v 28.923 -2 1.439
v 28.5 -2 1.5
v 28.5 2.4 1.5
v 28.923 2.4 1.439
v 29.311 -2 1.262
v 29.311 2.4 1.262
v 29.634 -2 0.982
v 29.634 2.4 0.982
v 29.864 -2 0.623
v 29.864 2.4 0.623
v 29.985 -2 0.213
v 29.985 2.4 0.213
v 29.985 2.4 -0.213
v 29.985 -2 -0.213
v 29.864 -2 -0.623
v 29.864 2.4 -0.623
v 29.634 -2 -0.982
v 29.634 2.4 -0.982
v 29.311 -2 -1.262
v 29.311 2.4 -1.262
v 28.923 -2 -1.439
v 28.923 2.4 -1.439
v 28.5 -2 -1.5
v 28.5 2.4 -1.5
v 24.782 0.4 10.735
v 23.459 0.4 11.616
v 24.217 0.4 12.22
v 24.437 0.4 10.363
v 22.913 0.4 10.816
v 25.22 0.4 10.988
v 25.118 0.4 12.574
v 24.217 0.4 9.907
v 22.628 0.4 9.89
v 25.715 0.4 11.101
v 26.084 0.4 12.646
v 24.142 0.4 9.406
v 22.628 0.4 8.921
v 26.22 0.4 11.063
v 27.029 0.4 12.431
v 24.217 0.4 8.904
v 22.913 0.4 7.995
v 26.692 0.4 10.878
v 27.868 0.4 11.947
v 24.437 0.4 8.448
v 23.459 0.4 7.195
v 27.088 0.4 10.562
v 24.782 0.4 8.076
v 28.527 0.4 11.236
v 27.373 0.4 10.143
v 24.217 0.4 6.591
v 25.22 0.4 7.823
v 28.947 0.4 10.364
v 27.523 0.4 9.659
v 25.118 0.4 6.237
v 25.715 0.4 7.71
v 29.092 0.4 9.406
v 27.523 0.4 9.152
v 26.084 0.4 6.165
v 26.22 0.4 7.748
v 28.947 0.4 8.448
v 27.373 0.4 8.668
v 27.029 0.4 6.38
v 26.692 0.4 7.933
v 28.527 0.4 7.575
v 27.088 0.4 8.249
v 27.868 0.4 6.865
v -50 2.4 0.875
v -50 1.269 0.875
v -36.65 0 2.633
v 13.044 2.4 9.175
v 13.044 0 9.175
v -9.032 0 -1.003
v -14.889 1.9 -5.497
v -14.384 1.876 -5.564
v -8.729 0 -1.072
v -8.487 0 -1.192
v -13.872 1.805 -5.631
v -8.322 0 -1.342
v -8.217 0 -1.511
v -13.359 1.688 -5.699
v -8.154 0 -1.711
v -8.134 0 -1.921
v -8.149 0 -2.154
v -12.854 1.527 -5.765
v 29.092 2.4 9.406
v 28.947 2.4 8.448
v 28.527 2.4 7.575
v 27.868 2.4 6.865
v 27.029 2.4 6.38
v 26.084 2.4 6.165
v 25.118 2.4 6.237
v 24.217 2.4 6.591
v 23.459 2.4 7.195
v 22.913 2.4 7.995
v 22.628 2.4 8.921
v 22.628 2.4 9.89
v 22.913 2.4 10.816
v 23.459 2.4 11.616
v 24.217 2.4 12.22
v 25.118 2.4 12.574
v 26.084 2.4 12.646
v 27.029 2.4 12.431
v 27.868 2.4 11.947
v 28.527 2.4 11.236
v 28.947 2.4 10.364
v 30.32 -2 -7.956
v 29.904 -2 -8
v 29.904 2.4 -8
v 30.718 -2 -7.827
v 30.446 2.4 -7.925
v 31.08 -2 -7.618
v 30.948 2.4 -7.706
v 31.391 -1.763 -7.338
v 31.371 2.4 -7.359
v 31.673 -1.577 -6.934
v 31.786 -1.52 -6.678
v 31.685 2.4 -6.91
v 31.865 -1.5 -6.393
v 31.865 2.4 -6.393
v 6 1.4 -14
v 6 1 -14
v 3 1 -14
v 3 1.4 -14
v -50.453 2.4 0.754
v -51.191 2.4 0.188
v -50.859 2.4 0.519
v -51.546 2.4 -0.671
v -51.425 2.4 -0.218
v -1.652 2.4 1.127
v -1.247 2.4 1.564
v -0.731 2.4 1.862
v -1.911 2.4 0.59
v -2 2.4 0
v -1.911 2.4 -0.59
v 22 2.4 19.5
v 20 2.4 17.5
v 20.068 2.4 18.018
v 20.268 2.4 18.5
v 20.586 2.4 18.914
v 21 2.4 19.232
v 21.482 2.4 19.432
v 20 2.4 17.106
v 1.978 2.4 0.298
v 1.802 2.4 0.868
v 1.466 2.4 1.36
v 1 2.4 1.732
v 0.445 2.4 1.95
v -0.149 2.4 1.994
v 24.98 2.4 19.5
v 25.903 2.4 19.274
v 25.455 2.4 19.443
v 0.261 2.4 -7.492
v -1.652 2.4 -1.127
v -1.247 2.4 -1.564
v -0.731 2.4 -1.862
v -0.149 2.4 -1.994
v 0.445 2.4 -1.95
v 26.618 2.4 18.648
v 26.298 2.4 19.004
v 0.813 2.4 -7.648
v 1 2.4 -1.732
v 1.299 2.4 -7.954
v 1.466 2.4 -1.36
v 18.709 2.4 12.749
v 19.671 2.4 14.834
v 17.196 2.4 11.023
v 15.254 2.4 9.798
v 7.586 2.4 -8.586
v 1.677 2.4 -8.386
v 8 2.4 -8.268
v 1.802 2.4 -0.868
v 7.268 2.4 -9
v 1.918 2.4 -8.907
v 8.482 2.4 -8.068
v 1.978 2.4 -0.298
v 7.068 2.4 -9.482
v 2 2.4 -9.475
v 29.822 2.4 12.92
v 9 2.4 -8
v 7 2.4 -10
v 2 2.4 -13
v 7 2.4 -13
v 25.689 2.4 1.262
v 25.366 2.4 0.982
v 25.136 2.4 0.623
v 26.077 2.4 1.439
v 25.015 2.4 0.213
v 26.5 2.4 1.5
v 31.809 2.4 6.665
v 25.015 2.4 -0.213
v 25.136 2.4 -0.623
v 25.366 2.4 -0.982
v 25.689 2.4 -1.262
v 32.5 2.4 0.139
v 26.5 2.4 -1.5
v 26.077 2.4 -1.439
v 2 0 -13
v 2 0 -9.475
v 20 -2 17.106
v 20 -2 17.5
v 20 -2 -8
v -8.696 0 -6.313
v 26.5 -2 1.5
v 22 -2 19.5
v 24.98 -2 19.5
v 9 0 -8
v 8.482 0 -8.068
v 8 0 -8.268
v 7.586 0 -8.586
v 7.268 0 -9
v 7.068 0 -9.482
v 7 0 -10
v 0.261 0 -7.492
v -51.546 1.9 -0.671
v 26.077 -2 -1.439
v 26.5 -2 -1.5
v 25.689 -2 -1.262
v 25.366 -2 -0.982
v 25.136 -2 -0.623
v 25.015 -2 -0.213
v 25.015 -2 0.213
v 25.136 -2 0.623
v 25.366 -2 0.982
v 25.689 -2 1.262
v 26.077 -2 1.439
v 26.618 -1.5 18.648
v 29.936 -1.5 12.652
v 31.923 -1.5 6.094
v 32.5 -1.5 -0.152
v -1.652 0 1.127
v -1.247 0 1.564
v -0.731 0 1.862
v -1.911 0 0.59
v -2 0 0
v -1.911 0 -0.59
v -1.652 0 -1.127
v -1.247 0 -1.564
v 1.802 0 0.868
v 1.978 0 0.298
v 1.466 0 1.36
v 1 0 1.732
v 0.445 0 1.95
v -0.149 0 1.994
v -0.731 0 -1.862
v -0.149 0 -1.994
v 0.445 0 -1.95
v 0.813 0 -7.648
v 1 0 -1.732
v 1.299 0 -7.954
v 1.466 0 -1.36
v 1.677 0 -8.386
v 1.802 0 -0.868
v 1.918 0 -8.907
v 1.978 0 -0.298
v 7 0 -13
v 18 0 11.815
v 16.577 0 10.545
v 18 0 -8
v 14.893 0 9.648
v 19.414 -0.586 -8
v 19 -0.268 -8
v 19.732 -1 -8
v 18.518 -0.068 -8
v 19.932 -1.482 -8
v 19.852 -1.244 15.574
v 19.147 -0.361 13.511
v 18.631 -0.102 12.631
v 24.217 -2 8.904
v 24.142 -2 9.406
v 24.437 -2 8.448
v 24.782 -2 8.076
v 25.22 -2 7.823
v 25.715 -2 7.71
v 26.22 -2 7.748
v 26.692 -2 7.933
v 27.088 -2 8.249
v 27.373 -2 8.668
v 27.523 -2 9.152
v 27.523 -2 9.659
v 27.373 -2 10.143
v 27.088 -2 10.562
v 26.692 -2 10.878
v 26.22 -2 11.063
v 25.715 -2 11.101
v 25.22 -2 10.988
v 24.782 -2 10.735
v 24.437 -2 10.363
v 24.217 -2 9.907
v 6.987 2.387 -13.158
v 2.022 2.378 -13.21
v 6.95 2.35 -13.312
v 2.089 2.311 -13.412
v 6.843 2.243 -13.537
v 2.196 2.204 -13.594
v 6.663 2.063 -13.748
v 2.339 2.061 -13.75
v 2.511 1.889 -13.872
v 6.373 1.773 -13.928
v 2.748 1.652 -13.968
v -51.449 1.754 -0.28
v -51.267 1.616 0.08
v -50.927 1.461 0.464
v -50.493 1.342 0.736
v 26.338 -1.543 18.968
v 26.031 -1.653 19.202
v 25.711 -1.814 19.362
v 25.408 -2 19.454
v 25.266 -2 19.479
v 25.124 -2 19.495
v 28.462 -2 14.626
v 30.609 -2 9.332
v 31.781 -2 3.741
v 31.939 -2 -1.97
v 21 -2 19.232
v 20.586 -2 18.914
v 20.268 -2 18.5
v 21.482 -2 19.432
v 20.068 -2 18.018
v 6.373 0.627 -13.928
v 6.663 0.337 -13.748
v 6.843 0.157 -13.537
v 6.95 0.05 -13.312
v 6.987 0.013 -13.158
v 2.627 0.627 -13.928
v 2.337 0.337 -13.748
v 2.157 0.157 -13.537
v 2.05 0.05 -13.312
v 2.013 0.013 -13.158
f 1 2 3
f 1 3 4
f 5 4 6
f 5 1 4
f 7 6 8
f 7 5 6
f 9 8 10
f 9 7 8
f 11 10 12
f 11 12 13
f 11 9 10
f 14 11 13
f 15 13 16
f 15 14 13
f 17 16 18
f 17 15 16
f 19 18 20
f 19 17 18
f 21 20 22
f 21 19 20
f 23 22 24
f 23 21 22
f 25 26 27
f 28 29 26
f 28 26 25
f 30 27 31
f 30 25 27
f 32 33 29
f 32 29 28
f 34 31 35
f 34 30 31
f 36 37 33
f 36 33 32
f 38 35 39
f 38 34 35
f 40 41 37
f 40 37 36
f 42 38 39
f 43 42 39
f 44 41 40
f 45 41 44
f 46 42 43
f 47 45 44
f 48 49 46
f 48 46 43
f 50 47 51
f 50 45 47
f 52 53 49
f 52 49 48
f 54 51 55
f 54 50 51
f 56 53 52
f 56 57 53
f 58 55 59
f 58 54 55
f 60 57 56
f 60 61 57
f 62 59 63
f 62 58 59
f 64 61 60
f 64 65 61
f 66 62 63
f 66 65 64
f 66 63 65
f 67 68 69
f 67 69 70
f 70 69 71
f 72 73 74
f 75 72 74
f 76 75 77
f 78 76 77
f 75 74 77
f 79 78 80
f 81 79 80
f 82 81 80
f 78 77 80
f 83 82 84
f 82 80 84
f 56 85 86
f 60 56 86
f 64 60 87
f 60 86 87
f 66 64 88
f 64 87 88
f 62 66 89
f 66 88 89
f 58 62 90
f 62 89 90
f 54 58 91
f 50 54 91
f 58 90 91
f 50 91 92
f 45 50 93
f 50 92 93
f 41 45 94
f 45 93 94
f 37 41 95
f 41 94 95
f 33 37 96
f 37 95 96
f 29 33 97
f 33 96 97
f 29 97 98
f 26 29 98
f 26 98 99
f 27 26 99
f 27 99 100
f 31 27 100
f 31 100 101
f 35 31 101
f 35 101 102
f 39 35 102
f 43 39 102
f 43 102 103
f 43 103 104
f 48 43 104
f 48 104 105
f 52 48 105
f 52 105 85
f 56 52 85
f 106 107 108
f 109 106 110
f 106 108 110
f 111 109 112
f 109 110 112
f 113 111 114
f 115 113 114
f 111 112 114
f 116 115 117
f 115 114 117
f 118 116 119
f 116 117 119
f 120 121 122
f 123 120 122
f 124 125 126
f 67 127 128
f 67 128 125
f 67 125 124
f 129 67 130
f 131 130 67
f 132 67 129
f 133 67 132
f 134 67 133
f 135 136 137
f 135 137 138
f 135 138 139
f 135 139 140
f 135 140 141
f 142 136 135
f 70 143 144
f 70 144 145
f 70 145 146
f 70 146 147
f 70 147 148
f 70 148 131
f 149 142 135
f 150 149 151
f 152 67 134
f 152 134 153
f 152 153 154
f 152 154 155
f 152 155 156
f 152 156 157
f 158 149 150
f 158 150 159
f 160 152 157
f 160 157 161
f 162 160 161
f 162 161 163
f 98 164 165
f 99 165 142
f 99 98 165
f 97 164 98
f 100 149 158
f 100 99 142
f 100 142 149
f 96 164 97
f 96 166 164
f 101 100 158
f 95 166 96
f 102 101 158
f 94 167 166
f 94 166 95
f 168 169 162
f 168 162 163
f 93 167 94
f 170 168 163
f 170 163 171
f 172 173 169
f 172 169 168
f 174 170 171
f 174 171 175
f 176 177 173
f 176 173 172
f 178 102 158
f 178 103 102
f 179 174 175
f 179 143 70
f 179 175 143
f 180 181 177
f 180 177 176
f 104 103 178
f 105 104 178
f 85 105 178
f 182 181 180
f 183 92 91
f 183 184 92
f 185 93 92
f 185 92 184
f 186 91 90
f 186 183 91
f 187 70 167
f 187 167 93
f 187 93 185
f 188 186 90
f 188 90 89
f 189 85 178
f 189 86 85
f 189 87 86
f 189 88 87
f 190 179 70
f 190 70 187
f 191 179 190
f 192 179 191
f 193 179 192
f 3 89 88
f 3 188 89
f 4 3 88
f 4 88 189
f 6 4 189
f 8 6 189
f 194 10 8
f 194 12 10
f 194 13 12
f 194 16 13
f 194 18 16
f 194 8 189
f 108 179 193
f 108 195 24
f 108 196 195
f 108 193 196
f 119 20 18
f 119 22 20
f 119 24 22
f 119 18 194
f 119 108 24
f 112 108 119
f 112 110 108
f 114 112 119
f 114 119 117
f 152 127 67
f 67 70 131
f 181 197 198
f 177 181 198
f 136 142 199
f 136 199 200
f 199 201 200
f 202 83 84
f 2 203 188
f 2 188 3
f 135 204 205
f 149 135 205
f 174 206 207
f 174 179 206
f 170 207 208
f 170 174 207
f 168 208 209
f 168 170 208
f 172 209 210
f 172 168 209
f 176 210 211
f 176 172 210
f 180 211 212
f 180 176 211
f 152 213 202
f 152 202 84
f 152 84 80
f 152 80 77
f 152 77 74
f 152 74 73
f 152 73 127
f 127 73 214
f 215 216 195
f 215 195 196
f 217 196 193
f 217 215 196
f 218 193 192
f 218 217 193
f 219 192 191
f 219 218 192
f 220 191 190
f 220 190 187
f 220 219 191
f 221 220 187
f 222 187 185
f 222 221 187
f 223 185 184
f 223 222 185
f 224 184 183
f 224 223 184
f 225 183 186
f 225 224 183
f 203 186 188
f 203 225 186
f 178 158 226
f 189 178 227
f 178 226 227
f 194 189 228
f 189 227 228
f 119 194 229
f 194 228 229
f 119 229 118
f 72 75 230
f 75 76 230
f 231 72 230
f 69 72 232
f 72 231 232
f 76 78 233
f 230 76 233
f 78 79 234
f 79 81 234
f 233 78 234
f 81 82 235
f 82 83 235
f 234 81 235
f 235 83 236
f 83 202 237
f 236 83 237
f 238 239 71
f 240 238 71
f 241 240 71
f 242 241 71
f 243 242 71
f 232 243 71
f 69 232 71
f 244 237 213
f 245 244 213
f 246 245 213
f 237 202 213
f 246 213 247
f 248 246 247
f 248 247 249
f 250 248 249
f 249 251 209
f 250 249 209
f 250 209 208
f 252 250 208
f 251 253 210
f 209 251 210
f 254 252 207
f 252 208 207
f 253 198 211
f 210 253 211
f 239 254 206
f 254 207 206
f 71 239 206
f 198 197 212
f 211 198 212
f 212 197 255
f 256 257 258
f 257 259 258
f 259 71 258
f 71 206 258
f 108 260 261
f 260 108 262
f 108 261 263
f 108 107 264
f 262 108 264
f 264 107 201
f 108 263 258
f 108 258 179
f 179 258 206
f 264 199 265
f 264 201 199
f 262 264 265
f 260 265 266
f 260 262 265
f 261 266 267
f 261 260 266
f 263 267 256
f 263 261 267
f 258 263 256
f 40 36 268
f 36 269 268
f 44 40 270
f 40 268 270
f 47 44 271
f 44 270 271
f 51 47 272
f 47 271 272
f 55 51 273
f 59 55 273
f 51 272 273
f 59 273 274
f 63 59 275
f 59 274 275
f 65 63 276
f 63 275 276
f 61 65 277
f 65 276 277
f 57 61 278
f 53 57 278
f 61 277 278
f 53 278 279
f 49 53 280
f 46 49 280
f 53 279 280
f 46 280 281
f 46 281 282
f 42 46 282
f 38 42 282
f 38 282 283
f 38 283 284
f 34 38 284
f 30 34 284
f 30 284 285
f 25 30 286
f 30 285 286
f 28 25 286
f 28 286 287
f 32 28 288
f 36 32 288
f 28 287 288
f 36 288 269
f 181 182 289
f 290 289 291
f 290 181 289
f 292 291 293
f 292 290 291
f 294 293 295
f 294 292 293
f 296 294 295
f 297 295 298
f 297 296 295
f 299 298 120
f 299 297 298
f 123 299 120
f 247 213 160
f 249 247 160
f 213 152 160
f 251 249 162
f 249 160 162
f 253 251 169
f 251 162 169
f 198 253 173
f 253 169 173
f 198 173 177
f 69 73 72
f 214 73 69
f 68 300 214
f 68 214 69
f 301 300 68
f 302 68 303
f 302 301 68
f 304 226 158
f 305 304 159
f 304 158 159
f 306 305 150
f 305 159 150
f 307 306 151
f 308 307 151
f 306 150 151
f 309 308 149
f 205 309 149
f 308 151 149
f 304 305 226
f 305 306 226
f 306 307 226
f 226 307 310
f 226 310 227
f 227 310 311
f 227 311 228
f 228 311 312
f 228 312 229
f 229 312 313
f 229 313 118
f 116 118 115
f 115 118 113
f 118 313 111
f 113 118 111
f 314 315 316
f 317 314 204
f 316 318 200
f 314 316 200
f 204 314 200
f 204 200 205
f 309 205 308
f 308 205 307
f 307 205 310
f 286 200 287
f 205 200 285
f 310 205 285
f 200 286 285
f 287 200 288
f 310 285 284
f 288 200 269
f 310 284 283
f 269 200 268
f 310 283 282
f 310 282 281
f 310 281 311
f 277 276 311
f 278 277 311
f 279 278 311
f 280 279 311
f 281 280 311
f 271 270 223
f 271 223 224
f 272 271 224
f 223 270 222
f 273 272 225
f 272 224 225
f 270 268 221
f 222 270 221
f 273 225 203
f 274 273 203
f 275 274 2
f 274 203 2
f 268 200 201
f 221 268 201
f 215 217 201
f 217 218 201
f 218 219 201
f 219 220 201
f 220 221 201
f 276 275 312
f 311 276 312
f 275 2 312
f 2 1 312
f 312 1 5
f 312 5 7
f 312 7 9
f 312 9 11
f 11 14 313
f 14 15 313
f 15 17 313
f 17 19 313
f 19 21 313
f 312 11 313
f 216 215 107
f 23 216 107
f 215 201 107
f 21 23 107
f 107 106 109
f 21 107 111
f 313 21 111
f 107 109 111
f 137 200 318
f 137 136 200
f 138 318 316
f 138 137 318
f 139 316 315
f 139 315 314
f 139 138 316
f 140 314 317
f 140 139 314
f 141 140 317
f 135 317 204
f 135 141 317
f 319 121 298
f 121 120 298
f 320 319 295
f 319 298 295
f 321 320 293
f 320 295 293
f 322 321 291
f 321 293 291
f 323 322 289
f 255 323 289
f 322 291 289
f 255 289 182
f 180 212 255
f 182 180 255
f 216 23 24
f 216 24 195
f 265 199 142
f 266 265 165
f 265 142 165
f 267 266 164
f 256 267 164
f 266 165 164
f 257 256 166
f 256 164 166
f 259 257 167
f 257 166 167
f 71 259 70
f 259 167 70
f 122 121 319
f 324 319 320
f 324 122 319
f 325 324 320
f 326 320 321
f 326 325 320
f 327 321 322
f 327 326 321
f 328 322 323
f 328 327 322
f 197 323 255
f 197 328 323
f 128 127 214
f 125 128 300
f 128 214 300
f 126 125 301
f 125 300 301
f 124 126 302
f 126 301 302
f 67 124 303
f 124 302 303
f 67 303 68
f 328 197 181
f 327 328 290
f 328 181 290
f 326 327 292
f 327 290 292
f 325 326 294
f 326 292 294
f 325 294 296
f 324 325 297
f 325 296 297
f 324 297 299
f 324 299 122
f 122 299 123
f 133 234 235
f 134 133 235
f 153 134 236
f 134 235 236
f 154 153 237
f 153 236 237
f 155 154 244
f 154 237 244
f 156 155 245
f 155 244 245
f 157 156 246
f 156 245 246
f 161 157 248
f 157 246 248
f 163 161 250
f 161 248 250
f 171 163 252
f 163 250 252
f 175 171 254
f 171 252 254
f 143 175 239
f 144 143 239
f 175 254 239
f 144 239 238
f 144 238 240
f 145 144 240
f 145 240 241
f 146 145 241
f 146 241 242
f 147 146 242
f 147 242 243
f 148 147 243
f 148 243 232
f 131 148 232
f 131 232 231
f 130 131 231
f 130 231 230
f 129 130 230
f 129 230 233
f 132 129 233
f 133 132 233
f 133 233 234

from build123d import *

# Parameters (mm, degrees)
BOSS_EXTRUDE1_DEPTH            = 2.4
BOSS_EXTRUDE2_DEPTH            = 2.4
BOSS_EXTRUDE2_DEPTH_BACK       = 2
FILLET1_R                      = 8
FILLET2_R                      = 2
F_3_0MM_START                  = -2
F_3_0MM_DOWEL_SLOT1_DEPTH      = 4.4
F_4_0_4_DIAMETER_HOLE1_D       = 4
CBORE_FOR_M3_SHCS1_D           = 3.4
CBORE_FOR_M3_SHCS1_CBORE_D     = 6.5
CBORE_FOR_M3_SHCS1_CBORE_DEPTH = 2
FILLET5_R                      = 2
FILLET6_R                      = 1
FILLET8_R                      = 2
CUT_EXTRUDE1_DEPTH             = 38
CHAMFER2_SIZE2                 = 1.9
CHAMFER2_SIZE                  = 5.220207097
FILLET9_R                      = 3


# Read off the part's stored shape, not the designer's step: Ø3.0mm Dowel Slot1
# Some blends are built 0.0001 mm under size
with BuildPart() as part:
    # Sketch1 → Boss-Extrude1 (new body)
    with BuildSketch(Plane(origin=(0, 0, 0), x_dir=(1, 0, 0), z_dir=(0, 1, 0))):
        with BuildLine():
            Line((2, 7.720929875), (-51.546411114, 0.671411114))
            ThreePointArc((-51.546411114, 0.671411114), (-51.035673477, -0.364262362), (-50, -0.875))
            Line((-50, -0.875), (20, -10.090674831))
            Line((20, -10.090674831), (20, 8))
            Line((20, 8), (7, 8))
            Line((7, 8), (7, 14))
            Line((7, 14), (2, 14))
            Line((2, 14), (2, 7.720929875))
        make_face()
    extrude(amount=BOSS_EXTRUDE1_DEPTH)

    # Sketch1<6> → Boss-Extrude2 (add, two sides: drawn at the far end of the back side and taken through both)
    with BuildSketch(Plane(origin=(0, 0, 0), x_dir=(1, 0, 0), z_dir=(0, 1, 0)).offset(-BOSS_EXTRUDE2_DEPTH_BACK)):
        with BuildLine():
            Line((20, 8), (20, -10.090674831))
            Line((20, -10.090674831), (20, -19.5))
            Line((20, -19.5), (26, -19.5))
            ThreePointArc((26, -19.5), (31.86887196, -6.373774392), (31.5, 8))
            Line((31.5, 8), (20, 8))
        make_face()
    extrude(amount=BOSS_EXTRUDE2_DEPTH + BOSS_EXTRUDE2_DEPTH_BACK)

    # Fillet1
    fillet1_edges = [part.edges().sort_by_distance(p)[0] for p in [
        (20, 1.2, 10.090674831),
    ]]
    fillet(fillet1_edges, radius=FILLET1_R)

    # Fillet2
    fillet2_edges = [part.edges().sort_by_distance(p)[0] for p in [
        (20, 0.2, 19.5),
        (31.5, 0.2, -8),
        (26, 0.2, 19.5),
    ]]
    fillet(fillet2_edges, radius=FILLET2_R)

    # Ø3.0mm Dowel Slot1 outline → Ø3.0mm Dowel Slot1 (cut)
    with BuildSketch(Plane(origin=(0, 0, 0), x_dir=(1, 0, 0), z_dir=(0, 1, 0)).offset(F_3_0MM_START)):
        with BuildLine():
            Line((26.5, -1.5), (28.5, -1.5))
            ThreePointArc((28.5, -1.5), (30, 0), (28.5, 1.5))
            Line((28.5, 1.5), (26.5, 1.5))
            ThreePointArc((26.5, 1.5), (25, 0), (26.5, -1.5))
        make_face()
    extrude(amount=F_3_0MM_DOWEL_SLOT1_DEPTH, mode=Mode.SUBTRACT)

    # Ø4.0 (4) Diameter Hole1 (through all)
    with Locations(Plane(origin=(0, 2.4, 0), x_dir=(1, 0, 0), z_dir=(0, 1, 0))):
        with Locations((0, 0)):
            Hole(F_4_0_4_DIAMETER_HOLE1_D / 2)

    # CBORE for M3 SHCS1 (through all)
    with Locations(Plane(origin=(0, 2.4, 0), x_dir=(1, 0, 0), z_dir=(0, 1, 0))):
        with Locations((25.841547072, -9.405553941)):
            CounterBoreHole(CBORE_FOR_M3_SHCS1_D / 2, CBORE_FOR_M3_SHCS1_CBORE_D / 2, CBORE_FOR_M3_SHCS1_CBORE_DEPTH)

    # Fillet5
    fillet5_edges = [part.edges().sort_by_distance(p)[0] for p in [
        (2, 1.2, -7.720929875),
        (7, 1.2, -8),
    ]]
    fillet(fillet5_edges, radius=FILLET5_R)

    # Fillet6
    fillet6_edges = [part.edges().sort_by_distance(p)[0] for p in [
        (4.5, 0, -14),
        (2, 1.2, -14),
        (7, 1.2, -14),
        (4.5, 2.4, -14),
    ]]
    fillet(fillet6_edges, radius=FILLET6_R)

    # Chamfer1
    # the kernel refuses this chamfer: 0.5 mm, written as the material it takes off along each edge
    with BuildSketch(Plane(origin=(0, -2, 0), x_dir=(0.7609198459057782, 0, 0.6488458893348455), z_dir=(-0.6488458893348455, 0, 0.7609198459057782))) as chamfer1_piece_1:
        with BuildLine():
            Line((32.514142136, 0.514142136), (31.985857864, -0.014142136))
            Line((31.985857864, -0.014142136), (31.985857864, -0.024142136))
            ThreePointArc((31.985857864, -0.024142136), (32.242928932, -0.01), (32.5, -0.01))
            Line((32.5, -0.01), (32.51, 0))
            ThreePointArc((32.51, 0), (32.51, 0.257071068), (32.524142136, 0.514142136))
            Line((32.524142136, 0.514142136), (32.514142136, 0.514142136))
        make_face()
    revolve(axis=Axis((0, -2, 0), (0, 1, 0)), revolution_arc=57.24100759, mode=Mode.SUBTRACT)

    # Fillet8
    fillet8_edges = [part.edges().sort_by_distance(p)[0] for p in [
        (20, 0, 4.553243268),
    ]]
    fillet(fillet8_edges, radius=FILLET8_R - 0.0001)  # a hair under: the kernel refuses the full size

    # Sketch8 → Cut-Extrude1 (cut)
    with BuildSketch(Plane(origin=(-50.581323439, 0, 6.659157562), x_dir=(0, -1, 0), z_dir=(0.9914448613738104, 0, -0.13052619222005302))):
        Polygon((-1.9, 7.393823865), (0, 2.173616768), (0, 7.393823865), align=None)
    extrude(amount=CUT_EXTRUDE1_DEPTH, mode=Mode.SUBTRACT)

    # Chamfer2
    chamfer2_edges = [part.edges().sort_by_distance(p)[0] for p in [
        (-13.530819505, 0, -3.043632668),
    ]]
    chamfer2_side = [part.faces().sort_by_distance(p)[0] for p in [
        (-13.4931446, 0, -3.048592663),
    ]]
    chamfer(chamfer2_edges, length=CHAMFER2_SIZE - 0.0001, length2=CHAMFER2_SIZE2 - 0.0001, reference=chamfer2_side[0])  # a hair under: the kernel refuses the full size

    # Fillet9
    fillet9_edges = [part.edges().sort_by_distance(p)[0] for p in [
        (-10.943077395, 0.94995, -3.384176821),
    ]]
    fillet(fillet9_edges, radius=FILLET9_R)


solid = part.part
